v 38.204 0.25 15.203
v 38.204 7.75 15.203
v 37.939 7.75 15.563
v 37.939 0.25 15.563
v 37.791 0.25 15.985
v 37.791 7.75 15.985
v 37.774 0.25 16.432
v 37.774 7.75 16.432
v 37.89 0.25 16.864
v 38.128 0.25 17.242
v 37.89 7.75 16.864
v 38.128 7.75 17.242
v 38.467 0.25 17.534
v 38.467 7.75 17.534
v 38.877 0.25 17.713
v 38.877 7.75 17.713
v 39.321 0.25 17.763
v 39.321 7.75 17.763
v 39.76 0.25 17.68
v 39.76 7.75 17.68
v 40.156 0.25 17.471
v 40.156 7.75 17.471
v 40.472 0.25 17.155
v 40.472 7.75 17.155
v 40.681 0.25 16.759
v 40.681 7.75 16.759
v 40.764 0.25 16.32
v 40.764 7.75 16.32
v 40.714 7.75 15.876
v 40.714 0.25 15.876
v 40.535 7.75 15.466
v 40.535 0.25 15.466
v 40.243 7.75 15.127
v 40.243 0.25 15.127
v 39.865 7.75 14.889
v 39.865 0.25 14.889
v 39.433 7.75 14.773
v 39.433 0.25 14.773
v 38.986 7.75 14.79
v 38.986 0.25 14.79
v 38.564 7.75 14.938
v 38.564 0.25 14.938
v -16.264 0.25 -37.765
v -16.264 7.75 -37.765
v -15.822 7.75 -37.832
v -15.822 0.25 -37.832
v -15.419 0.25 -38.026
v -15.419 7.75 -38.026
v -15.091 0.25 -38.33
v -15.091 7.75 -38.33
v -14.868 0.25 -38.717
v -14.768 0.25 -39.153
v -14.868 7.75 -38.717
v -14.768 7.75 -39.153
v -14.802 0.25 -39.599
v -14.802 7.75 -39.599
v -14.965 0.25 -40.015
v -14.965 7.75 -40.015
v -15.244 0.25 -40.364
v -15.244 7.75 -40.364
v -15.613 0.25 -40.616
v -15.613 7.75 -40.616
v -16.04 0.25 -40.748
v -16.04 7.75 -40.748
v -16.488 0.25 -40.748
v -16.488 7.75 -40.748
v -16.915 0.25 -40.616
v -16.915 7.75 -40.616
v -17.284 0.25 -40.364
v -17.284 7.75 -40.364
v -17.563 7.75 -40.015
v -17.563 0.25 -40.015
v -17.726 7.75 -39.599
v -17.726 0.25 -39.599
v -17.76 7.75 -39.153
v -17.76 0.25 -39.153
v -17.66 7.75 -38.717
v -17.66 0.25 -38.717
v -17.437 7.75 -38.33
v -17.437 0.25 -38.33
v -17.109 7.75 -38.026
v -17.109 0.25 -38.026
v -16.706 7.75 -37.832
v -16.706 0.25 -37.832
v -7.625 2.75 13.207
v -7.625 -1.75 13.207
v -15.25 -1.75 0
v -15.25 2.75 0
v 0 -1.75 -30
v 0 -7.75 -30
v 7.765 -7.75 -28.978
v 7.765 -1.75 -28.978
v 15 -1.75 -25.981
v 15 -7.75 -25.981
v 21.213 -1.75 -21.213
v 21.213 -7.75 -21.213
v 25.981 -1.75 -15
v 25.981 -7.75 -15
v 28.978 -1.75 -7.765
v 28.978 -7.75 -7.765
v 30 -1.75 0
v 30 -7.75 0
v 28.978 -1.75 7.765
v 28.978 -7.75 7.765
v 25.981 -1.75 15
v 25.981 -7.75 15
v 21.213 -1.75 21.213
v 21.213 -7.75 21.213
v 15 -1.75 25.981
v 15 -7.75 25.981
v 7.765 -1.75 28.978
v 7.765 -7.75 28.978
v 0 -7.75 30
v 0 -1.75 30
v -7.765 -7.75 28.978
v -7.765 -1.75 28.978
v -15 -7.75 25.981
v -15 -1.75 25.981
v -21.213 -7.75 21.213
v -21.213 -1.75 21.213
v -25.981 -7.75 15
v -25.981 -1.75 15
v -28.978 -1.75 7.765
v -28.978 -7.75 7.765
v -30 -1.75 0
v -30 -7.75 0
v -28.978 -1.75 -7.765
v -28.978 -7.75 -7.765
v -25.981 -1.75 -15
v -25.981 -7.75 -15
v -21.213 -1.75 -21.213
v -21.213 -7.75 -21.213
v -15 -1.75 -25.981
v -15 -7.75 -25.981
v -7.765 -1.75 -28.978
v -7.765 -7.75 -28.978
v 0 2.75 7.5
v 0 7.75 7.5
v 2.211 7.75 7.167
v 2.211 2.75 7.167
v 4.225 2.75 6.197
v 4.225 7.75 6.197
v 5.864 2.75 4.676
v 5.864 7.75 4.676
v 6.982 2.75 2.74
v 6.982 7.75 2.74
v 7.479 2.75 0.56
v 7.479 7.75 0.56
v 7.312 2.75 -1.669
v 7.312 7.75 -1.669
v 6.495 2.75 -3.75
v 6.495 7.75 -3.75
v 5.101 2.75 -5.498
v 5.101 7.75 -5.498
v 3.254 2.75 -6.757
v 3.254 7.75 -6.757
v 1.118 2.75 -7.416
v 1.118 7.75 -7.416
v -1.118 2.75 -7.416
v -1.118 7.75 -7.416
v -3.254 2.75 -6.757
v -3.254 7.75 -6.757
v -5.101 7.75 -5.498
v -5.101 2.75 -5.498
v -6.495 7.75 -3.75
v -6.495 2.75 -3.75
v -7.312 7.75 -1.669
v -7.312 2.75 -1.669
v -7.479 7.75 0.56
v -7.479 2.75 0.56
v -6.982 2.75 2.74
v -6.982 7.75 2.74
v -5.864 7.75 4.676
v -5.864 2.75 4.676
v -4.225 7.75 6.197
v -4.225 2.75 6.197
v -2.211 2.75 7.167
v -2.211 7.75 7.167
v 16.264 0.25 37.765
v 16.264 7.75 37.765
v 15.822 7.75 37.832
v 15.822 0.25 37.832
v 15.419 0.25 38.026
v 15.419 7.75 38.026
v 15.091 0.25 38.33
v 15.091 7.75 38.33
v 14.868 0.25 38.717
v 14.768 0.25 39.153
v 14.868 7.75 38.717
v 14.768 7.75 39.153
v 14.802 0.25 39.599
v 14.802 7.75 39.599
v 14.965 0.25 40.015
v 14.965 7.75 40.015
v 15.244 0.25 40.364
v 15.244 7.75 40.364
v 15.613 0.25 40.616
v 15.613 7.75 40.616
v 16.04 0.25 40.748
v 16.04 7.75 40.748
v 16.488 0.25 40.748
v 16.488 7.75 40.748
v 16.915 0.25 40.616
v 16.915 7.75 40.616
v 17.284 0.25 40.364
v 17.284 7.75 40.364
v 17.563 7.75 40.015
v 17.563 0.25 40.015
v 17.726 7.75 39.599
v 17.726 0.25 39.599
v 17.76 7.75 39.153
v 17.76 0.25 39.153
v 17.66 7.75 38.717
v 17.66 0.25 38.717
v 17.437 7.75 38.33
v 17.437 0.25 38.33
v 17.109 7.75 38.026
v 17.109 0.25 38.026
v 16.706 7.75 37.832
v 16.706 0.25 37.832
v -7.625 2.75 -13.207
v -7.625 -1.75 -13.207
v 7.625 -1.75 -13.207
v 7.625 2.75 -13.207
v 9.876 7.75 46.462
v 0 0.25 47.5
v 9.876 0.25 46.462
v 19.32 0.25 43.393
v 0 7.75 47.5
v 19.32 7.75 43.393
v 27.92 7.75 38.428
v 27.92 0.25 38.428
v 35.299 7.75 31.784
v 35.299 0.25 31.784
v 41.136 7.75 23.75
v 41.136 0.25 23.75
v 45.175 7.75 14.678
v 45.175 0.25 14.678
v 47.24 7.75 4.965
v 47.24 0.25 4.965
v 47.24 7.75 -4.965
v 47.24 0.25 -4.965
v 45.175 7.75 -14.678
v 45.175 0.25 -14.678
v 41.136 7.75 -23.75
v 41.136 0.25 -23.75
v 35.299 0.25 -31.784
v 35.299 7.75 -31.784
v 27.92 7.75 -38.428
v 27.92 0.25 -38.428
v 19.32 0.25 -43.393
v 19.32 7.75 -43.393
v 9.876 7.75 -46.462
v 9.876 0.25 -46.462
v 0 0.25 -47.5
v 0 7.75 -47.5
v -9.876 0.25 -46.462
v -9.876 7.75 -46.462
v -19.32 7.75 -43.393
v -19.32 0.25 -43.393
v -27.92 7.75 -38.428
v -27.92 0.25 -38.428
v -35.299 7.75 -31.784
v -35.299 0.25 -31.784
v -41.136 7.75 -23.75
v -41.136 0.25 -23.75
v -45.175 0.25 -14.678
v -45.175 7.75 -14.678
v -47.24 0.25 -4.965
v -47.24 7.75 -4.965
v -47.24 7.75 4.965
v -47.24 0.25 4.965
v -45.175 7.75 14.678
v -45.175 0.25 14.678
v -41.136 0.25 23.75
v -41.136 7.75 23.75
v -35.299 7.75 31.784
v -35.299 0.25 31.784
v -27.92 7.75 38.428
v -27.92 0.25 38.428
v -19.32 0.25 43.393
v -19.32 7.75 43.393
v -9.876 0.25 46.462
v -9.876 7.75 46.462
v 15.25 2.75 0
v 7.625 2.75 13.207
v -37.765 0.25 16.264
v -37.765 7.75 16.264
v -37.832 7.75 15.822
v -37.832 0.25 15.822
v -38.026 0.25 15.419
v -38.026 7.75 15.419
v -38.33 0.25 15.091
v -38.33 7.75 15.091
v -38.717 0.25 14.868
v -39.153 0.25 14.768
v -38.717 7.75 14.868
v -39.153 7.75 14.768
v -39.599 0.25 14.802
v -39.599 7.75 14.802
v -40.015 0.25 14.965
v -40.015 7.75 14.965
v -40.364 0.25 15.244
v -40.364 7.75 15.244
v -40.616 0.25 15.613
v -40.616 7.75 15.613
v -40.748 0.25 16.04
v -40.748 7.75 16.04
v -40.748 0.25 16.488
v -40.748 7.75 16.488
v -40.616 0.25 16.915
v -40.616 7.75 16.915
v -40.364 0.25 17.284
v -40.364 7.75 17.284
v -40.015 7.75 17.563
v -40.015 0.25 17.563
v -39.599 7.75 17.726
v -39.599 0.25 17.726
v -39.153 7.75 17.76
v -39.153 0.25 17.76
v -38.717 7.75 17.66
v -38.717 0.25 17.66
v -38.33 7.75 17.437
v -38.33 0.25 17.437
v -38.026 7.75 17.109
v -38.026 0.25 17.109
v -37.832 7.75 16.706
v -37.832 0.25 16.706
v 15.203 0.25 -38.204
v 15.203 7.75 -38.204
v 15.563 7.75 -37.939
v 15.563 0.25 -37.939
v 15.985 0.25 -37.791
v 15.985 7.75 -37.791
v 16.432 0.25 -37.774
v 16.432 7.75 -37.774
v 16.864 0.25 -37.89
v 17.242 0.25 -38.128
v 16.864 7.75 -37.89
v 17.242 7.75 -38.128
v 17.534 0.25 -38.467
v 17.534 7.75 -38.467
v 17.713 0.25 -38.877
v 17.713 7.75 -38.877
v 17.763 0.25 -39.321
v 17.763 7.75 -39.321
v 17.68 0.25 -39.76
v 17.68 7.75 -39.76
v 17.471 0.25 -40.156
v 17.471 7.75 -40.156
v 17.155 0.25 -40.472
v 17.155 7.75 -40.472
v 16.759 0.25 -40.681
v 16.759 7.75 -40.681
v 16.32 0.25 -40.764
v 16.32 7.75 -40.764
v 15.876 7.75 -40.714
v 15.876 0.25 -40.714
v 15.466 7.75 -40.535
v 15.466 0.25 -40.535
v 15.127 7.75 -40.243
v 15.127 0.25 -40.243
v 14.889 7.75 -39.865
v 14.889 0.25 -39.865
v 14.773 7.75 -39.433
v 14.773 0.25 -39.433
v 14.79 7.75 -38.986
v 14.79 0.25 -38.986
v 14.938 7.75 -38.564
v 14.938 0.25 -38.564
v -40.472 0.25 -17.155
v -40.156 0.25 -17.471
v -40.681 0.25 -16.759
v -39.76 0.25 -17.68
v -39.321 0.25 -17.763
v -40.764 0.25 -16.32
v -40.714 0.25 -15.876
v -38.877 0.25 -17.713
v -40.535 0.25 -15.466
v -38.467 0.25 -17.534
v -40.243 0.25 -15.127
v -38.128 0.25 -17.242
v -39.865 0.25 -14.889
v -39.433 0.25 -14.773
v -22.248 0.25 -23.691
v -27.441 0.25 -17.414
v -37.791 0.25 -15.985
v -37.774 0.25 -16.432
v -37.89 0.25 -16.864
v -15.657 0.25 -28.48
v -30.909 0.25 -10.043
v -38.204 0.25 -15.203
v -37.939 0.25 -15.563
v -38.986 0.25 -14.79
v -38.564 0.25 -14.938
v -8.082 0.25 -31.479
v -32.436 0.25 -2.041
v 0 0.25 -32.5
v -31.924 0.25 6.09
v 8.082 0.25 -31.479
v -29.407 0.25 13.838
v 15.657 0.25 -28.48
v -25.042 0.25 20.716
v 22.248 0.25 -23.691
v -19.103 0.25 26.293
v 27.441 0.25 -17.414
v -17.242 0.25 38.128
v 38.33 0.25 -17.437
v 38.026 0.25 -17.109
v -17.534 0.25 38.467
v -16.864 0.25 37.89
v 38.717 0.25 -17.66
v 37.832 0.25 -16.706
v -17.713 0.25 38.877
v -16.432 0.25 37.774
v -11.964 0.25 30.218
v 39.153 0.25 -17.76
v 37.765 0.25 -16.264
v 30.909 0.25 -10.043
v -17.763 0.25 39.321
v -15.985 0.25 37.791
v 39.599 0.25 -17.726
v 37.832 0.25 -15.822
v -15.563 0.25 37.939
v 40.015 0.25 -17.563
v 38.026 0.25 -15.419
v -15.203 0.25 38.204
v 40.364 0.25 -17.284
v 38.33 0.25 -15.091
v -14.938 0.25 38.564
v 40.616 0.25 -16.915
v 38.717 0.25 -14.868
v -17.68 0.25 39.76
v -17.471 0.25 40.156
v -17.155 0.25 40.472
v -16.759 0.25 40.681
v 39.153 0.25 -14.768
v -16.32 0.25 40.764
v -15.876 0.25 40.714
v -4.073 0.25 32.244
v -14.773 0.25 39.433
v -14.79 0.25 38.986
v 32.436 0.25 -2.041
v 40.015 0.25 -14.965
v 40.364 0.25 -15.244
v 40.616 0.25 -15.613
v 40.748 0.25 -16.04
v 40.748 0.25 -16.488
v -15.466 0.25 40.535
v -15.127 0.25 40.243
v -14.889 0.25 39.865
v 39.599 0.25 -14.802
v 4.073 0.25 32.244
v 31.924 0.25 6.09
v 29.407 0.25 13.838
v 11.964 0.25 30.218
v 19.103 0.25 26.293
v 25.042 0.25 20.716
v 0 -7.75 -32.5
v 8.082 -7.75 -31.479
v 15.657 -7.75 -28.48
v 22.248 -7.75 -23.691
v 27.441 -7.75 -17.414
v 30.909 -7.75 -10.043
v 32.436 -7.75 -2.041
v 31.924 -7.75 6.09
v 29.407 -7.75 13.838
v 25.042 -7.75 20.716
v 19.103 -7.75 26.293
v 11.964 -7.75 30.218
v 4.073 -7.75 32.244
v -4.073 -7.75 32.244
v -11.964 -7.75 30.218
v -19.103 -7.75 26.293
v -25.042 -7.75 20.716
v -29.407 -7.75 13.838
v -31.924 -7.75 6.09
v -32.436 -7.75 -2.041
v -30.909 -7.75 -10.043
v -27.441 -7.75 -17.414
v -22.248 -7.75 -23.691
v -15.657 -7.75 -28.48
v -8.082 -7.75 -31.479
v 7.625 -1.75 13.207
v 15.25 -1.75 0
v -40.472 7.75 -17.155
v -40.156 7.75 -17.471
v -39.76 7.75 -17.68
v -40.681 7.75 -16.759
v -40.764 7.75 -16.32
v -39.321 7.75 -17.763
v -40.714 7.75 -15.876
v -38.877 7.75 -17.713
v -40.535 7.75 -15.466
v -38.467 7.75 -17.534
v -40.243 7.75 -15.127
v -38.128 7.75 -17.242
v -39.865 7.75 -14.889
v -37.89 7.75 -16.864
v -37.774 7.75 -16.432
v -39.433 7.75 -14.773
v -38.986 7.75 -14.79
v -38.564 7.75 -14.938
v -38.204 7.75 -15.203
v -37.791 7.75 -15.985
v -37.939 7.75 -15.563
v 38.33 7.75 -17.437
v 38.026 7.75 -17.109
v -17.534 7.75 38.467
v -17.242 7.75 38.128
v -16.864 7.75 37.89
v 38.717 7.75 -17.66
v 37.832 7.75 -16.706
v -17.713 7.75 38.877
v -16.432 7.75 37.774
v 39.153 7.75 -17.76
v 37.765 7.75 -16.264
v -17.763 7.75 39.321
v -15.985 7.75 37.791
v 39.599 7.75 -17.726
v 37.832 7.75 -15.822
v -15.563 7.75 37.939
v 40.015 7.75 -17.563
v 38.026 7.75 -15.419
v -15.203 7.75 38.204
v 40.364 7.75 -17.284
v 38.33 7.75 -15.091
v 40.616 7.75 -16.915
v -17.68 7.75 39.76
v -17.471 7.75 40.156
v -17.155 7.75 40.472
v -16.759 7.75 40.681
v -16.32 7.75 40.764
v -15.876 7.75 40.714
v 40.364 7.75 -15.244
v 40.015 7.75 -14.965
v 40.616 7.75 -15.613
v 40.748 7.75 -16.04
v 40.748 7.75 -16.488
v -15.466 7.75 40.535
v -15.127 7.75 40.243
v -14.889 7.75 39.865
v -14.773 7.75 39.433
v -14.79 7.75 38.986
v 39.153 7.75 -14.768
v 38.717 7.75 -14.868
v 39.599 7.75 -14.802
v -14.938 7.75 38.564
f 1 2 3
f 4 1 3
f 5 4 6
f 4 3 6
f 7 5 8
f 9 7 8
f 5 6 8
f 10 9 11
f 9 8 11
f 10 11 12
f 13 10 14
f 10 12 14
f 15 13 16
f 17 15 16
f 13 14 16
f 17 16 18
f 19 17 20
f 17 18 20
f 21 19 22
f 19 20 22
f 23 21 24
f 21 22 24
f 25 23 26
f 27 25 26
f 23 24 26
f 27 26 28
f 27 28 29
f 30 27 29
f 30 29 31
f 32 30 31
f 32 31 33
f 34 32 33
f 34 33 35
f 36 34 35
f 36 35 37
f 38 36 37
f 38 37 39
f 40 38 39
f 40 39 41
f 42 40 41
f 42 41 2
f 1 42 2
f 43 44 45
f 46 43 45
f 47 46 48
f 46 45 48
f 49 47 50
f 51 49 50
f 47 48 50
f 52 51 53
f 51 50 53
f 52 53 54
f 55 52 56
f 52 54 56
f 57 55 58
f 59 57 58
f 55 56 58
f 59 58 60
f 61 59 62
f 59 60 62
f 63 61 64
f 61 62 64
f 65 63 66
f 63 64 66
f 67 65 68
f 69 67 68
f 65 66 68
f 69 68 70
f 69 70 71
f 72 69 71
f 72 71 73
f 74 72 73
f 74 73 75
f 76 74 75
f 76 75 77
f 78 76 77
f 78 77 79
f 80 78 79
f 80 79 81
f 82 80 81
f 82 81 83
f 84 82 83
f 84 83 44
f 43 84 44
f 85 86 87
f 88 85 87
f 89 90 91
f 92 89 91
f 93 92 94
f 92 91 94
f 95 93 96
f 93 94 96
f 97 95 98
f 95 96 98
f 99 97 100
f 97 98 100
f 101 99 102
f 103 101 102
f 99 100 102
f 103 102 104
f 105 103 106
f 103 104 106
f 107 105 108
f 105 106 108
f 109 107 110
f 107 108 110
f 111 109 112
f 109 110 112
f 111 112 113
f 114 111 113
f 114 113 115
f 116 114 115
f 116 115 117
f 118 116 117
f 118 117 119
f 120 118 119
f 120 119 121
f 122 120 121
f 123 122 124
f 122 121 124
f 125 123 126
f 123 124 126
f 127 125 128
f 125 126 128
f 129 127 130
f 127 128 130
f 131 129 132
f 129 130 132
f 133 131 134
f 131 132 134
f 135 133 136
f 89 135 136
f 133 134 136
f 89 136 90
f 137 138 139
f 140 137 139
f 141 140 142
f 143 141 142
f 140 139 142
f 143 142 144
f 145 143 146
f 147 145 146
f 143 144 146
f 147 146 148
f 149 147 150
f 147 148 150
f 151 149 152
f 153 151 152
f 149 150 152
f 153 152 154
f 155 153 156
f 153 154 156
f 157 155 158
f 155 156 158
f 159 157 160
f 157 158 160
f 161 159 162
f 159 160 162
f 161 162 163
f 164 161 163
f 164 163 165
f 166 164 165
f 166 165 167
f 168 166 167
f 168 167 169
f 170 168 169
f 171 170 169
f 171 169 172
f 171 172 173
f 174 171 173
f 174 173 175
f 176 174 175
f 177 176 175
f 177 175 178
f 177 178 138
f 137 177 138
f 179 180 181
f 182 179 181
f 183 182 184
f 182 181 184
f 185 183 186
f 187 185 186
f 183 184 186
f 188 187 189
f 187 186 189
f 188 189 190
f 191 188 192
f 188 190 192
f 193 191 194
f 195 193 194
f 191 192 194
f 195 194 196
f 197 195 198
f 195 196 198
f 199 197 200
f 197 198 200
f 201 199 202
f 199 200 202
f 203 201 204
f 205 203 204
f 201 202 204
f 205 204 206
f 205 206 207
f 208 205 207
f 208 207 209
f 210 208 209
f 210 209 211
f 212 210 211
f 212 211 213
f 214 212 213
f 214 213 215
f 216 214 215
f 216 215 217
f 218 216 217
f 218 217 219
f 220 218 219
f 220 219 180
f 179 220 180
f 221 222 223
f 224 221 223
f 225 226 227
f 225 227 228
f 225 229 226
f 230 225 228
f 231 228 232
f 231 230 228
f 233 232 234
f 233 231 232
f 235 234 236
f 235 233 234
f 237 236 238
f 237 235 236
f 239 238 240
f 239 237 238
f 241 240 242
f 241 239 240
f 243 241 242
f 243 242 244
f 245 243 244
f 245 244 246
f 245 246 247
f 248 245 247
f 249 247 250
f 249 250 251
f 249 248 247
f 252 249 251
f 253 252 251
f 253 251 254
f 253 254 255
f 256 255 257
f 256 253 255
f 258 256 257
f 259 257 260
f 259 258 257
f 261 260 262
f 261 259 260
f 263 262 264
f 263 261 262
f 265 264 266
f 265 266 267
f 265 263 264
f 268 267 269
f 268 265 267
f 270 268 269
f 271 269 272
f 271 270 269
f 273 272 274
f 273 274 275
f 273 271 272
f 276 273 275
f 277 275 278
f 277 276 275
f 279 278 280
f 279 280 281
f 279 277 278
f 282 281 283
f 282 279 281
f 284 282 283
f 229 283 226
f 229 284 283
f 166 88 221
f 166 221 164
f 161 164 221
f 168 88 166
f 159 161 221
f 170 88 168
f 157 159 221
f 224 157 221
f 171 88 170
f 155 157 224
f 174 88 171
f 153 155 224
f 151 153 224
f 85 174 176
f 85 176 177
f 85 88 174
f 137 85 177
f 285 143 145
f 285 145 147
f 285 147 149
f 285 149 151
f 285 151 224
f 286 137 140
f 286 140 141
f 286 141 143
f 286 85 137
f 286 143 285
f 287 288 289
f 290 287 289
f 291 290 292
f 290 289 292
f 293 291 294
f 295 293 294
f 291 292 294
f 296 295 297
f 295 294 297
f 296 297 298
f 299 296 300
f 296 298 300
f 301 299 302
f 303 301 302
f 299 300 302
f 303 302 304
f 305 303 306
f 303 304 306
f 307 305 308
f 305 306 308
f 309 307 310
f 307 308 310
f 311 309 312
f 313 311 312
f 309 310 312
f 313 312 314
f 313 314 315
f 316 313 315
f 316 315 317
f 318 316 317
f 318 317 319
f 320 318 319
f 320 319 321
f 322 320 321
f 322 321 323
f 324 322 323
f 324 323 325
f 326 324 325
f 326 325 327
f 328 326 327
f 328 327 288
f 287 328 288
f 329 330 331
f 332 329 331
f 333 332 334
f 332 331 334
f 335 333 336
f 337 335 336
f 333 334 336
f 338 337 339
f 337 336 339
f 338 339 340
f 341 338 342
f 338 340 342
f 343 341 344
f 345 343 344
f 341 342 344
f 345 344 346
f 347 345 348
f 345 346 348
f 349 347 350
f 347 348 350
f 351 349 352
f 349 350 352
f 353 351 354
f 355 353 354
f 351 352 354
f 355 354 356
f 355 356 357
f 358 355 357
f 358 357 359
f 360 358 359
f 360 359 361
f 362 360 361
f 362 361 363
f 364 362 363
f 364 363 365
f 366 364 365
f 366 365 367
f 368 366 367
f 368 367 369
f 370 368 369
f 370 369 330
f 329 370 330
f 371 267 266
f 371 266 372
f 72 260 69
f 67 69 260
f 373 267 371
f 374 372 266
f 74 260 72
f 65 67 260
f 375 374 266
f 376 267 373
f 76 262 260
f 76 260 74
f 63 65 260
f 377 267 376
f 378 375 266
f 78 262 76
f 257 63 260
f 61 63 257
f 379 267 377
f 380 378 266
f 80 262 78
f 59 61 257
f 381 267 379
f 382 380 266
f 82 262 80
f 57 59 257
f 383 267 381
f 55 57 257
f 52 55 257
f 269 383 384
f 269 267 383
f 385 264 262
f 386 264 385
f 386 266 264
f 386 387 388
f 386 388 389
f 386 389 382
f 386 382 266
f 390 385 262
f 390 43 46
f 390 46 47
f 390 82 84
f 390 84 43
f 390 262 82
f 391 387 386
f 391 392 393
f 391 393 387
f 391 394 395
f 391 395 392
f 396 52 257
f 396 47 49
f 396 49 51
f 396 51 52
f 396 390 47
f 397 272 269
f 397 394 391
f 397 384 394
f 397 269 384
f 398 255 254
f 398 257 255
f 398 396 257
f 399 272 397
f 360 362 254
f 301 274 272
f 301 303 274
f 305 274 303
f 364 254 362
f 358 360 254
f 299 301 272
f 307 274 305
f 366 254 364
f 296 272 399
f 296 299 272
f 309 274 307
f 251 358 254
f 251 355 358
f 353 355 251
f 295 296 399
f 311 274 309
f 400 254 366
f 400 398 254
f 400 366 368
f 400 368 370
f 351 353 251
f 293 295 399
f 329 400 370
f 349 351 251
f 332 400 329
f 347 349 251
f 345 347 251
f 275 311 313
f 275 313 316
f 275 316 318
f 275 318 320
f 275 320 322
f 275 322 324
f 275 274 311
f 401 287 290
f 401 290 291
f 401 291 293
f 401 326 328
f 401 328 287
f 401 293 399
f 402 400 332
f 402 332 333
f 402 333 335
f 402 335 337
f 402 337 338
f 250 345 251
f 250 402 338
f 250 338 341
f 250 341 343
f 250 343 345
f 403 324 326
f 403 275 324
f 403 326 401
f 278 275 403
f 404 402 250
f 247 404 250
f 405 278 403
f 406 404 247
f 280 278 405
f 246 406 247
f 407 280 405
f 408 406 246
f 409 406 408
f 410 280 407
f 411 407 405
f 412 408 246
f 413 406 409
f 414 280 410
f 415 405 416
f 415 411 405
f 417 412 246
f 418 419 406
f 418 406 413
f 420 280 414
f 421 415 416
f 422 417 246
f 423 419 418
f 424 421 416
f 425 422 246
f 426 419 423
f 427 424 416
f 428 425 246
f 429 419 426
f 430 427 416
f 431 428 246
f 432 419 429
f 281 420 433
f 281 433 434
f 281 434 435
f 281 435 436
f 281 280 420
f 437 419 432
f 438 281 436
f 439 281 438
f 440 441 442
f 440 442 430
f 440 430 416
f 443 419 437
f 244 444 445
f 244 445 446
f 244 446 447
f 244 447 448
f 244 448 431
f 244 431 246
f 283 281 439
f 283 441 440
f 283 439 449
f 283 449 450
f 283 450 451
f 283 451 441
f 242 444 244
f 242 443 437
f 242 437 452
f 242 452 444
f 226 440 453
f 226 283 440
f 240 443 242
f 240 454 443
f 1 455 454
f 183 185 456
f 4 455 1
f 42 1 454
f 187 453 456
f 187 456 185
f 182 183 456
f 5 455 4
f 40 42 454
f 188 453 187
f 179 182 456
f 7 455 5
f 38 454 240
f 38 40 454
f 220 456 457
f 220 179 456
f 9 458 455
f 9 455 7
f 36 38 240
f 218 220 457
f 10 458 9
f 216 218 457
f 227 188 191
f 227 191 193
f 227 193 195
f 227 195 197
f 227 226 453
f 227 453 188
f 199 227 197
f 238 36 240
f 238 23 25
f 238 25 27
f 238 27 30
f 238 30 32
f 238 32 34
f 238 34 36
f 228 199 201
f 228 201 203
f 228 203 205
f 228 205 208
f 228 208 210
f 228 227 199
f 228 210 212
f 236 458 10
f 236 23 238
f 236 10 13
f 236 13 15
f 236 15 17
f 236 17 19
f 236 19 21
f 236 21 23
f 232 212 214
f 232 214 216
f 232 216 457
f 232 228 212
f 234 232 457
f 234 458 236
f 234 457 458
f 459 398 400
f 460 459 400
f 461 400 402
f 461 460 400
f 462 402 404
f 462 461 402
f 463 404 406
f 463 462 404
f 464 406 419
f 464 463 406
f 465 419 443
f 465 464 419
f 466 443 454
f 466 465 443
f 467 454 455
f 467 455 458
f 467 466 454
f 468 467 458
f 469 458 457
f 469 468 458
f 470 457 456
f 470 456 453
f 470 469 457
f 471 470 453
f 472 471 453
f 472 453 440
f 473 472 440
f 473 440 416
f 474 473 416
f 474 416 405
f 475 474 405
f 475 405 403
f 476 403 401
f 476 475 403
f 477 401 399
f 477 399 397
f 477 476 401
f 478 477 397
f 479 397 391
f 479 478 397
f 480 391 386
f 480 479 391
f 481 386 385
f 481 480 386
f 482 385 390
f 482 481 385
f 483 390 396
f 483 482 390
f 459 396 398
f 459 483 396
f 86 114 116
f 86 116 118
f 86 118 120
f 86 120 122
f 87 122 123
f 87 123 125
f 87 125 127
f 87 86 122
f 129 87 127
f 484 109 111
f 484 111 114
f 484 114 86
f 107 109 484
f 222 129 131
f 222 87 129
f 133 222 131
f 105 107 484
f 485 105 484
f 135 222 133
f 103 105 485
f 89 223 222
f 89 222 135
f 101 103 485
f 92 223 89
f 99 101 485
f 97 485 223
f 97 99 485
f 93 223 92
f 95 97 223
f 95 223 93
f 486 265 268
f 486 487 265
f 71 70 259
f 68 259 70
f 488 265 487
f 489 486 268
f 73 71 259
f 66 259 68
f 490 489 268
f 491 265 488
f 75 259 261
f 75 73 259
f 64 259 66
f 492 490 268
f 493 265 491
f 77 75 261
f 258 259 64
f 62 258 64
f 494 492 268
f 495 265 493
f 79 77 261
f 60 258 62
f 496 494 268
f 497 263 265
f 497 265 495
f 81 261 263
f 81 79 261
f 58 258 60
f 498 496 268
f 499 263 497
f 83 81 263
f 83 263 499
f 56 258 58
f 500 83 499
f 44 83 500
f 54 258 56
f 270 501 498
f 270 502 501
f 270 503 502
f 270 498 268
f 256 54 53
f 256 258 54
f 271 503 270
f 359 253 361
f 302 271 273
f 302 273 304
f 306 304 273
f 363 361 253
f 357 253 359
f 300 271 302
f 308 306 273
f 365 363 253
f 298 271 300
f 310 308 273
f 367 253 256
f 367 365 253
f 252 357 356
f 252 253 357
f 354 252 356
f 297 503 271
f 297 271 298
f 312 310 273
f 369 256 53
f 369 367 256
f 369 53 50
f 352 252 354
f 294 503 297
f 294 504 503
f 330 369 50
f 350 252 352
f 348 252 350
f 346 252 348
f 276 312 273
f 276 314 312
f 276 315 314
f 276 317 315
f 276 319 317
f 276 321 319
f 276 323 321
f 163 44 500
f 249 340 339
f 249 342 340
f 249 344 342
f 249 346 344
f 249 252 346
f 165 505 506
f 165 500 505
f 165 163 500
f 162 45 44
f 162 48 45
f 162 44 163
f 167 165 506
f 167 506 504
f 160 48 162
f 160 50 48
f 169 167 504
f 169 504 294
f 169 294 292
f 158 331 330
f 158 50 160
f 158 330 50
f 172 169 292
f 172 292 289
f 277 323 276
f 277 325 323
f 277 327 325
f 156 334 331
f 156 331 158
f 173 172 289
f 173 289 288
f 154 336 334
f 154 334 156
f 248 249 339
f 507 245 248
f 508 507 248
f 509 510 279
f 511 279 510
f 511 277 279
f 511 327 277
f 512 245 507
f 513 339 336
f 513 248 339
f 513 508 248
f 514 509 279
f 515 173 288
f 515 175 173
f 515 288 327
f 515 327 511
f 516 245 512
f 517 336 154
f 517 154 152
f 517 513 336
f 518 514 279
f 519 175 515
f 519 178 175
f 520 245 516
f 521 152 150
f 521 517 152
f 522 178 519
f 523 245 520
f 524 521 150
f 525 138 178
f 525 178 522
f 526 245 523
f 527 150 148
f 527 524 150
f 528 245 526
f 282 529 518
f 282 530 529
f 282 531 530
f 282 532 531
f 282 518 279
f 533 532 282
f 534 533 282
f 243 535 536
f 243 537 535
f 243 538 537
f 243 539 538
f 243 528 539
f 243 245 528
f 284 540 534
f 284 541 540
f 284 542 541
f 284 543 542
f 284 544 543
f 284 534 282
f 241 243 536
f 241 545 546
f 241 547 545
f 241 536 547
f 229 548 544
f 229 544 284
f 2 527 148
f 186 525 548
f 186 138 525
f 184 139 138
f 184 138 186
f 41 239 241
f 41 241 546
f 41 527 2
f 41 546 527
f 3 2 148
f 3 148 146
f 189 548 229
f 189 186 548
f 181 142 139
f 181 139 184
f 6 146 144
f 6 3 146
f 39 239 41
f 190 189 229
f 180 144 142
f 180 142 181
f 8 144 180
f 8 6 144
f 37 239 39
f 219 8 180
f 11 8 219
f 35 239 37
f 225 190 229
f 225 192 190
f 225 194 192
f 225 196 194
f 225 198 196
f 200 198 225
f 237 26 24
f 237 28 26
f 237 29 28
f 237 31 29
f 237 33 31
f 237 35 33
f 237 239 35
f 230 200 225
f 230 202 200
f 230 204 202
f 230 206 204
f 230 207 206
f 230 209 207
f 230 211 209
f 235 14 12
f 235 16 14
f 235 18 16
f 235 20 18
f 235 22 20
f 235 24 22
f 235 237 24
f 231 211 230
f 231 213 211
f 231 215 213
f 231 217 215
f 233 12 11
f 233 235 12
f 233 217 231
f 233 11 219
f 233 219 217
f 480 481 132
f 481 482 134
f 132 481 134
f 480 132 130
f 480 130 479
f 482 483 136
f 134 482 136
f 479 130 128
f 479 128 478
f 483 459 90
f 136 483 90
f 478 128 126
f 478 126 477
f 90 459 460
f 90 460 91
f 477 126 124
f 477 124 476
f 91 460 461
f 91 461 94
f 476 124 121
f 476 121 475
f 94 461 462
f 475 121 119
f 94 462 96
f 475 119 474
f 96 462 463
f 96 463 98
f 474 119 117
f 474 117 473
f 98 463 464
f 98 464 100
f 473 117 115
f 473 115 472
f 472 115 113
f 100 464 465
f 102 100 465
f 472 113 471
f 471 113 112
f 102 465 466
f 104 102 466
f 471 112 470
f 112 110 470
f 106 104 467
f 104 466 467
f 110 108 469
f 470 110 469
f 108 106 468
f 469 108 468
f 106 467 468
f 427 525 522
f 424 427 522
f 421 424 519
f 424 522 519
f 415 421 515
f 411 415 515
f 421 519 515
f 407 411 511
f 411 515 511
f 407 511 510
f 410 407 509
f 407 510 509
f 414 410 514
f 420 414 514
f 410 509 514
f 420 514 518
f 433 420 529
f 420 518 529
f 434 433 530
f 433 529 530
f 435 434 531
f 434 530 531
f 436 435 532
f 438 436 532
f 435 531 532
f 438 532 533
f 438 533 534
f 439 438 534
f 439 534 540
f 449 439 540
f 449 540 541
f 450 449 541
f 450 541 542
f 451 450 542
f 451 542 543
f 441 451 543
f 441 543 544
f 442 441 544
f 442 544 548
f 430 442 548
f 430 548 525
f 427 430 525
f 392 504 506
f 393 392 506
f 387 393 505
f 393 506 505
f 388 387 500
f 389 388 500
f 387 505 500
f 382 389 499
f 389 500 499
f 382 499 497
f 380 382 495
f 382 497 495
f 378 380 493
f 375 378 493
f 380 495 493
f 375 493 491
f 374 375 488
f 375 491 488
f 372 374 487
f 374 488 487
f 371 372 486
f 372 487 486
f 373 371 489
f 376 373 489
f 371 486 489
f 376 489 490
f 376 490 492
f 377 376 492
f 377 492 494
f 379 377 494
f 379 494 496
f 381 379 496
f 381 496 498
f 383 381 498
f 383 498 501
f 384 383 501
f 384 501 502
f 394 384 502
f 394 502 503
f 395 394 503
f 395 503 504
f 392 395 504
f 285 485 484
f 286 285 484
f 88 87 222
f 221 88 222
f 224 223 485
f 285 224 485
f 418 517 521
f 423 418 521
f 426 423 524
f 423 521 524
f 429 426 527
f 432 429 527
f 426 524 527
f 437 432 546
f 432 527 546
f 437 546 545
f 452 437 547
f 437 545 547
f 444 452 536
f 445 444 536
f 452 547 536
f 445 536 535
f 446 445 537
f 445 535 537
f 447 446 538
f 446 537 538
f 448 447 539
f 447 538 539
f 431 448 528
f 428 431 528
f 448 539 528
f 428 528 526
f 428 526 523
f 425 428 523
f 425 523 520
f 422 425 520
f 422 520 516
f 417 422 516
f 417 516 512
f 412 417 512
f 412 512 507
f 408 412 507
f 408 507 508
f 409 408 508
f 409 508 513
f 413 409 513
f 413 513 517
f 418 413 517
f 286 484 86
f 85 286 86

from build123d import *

# Parameters (mm, degrees)
IZIM1_R                     = 47.5
Y_KSEKLIK_EKSTR_ZYON1_DEPTH = 7.75
IZIM2_OUTSIDE_W             = 124.048
IZIM2_OUTSIDE_H             = 124.048
IZIM2_OUTSIDE_R             = 32.5
KES_EKSTR_ZYON1_DEPTH       = 8
KES_EKSTR_ZYON2_DEPTH       = 10.5
IZIM4_R                     = 30
KES_EKSTR_ZYON3_DEPTH       = 6
IZIM5_R                     = 1.5
KES_EKSTR_ZYON4_DEPTH       = 69.940191471
DAIRESEL_KAPLAMA1_COUNT     = 8
IZIM6_R                     = 7.5
KES_EKSTR_ZYON5_DEPTH       = 69.940191471


with BuildPart() as part:
    # Çizim1 → Yükseklik-Ekstrüzyon1 (new, symmetric)
    with BuildSketch(Plane(origin=(0, 0, 0), x_dir=(1, 0, 0), z_dir=(0, 1, 0))):
        with Locations(Location((0, 0, 0), (0, 0, 270))):
            Circle(IZIM1_R)
    extrude(amount=Y_KSEKLIK_EKSTR_ZYON1_DEPTH, both=True)

    # Çizim2 outside → Kes-Ekstrüzyon1 (cut)
    with BuildSketch(Plane.XZ.offset(7.75)):
        Rectangle(IZIM2_OUTSIDE_W, IZIM2_OUTSIDE_H)
        with Locations(Location((0, 0, 0), (0, 0, 270))):
            Circle(IZIM2_OUTSIDE_R, mode=Mode.SUBTRACT)
    extrude(amount=-KES_EKSTR_ZYON1_DEPTH, mode=Mode.SUBTRACT)

    # Çizim3 → Kes-Ekstrüzyon2 (cut)
    with BuildSketch(Plane.XZ.offset(7.75)):
        Polygon((15.25, 0), (7.625, 13.206887408), (-7.625, 13.206887408), (-15.25, 0), (-7.625, -13.206887408), (7.625, -13.206887408), align=None)
    extrude(amount=-KES_EKSTR_ZYON2_DEPTH, mode=Mode.SUBTRACT)

    # Çizim4 → Kes-Ekstrüzyon3 (cut)
    with BuildSketch(Plane.XZ.offset(7.75)):
        with Locations(Location((0, 0, 0), (0, 0, 270))):
            Circle(IZIM4_R)
    extrude(amount=-KES_EKSTR_ZYON3_DEPTH, mode=Mode.SUBTRACT)

    # Çizim5 → Kes-Ekstrüzyon4 (cut, through all)
    with BuildSketch(Plane(origin=(0, 7.75, 0), x_dir=(1, 0, 0), z_dir=(0, 1, 0))):
        with Locations(Location((-16.264045876, 39.264880132, 0), (0, 0, 270))):
            Circle(IZIM5_R)
    kes_ekstr_zyon4 = extrude(amount=-KES_EKSTR_ZYON4_DEPTH, mode=Mode.SUBTRACT)

    # Dairesel Kaplama1: Kes-Ekstrüzyon4 ×8 about axis
    dairesel_kaplama1_axis = Axis((0, 0, 0), (0, 1, 0))
    for i in range(1, DAIRESEL_KAPLAMA1_COUNT):
        add(kes_ekstr_zyon4.rotate(dairesel_kaplama1_axis, i * 360 / DAIRESEL_KAPLAMA1_COUNT), mode=Mode.SUBTRACT)

    # Çizim6 → Kes-Ekstrüzyon5 (cut, through all)
    with BuildSketch(Plane(origin=(0, 7.75, 0), x_dir=(1, 0, 0), z_dir=(0, 1, 0))):
        with Locations(Location((0, 0, 0), (0, 0, 270))):
            Circle(IZIM6_R)
    extrude(amount=-KES_EKSTR_ZYON5_DEPTH, mode=Mode.SUBTRACT)


solid = part.part
